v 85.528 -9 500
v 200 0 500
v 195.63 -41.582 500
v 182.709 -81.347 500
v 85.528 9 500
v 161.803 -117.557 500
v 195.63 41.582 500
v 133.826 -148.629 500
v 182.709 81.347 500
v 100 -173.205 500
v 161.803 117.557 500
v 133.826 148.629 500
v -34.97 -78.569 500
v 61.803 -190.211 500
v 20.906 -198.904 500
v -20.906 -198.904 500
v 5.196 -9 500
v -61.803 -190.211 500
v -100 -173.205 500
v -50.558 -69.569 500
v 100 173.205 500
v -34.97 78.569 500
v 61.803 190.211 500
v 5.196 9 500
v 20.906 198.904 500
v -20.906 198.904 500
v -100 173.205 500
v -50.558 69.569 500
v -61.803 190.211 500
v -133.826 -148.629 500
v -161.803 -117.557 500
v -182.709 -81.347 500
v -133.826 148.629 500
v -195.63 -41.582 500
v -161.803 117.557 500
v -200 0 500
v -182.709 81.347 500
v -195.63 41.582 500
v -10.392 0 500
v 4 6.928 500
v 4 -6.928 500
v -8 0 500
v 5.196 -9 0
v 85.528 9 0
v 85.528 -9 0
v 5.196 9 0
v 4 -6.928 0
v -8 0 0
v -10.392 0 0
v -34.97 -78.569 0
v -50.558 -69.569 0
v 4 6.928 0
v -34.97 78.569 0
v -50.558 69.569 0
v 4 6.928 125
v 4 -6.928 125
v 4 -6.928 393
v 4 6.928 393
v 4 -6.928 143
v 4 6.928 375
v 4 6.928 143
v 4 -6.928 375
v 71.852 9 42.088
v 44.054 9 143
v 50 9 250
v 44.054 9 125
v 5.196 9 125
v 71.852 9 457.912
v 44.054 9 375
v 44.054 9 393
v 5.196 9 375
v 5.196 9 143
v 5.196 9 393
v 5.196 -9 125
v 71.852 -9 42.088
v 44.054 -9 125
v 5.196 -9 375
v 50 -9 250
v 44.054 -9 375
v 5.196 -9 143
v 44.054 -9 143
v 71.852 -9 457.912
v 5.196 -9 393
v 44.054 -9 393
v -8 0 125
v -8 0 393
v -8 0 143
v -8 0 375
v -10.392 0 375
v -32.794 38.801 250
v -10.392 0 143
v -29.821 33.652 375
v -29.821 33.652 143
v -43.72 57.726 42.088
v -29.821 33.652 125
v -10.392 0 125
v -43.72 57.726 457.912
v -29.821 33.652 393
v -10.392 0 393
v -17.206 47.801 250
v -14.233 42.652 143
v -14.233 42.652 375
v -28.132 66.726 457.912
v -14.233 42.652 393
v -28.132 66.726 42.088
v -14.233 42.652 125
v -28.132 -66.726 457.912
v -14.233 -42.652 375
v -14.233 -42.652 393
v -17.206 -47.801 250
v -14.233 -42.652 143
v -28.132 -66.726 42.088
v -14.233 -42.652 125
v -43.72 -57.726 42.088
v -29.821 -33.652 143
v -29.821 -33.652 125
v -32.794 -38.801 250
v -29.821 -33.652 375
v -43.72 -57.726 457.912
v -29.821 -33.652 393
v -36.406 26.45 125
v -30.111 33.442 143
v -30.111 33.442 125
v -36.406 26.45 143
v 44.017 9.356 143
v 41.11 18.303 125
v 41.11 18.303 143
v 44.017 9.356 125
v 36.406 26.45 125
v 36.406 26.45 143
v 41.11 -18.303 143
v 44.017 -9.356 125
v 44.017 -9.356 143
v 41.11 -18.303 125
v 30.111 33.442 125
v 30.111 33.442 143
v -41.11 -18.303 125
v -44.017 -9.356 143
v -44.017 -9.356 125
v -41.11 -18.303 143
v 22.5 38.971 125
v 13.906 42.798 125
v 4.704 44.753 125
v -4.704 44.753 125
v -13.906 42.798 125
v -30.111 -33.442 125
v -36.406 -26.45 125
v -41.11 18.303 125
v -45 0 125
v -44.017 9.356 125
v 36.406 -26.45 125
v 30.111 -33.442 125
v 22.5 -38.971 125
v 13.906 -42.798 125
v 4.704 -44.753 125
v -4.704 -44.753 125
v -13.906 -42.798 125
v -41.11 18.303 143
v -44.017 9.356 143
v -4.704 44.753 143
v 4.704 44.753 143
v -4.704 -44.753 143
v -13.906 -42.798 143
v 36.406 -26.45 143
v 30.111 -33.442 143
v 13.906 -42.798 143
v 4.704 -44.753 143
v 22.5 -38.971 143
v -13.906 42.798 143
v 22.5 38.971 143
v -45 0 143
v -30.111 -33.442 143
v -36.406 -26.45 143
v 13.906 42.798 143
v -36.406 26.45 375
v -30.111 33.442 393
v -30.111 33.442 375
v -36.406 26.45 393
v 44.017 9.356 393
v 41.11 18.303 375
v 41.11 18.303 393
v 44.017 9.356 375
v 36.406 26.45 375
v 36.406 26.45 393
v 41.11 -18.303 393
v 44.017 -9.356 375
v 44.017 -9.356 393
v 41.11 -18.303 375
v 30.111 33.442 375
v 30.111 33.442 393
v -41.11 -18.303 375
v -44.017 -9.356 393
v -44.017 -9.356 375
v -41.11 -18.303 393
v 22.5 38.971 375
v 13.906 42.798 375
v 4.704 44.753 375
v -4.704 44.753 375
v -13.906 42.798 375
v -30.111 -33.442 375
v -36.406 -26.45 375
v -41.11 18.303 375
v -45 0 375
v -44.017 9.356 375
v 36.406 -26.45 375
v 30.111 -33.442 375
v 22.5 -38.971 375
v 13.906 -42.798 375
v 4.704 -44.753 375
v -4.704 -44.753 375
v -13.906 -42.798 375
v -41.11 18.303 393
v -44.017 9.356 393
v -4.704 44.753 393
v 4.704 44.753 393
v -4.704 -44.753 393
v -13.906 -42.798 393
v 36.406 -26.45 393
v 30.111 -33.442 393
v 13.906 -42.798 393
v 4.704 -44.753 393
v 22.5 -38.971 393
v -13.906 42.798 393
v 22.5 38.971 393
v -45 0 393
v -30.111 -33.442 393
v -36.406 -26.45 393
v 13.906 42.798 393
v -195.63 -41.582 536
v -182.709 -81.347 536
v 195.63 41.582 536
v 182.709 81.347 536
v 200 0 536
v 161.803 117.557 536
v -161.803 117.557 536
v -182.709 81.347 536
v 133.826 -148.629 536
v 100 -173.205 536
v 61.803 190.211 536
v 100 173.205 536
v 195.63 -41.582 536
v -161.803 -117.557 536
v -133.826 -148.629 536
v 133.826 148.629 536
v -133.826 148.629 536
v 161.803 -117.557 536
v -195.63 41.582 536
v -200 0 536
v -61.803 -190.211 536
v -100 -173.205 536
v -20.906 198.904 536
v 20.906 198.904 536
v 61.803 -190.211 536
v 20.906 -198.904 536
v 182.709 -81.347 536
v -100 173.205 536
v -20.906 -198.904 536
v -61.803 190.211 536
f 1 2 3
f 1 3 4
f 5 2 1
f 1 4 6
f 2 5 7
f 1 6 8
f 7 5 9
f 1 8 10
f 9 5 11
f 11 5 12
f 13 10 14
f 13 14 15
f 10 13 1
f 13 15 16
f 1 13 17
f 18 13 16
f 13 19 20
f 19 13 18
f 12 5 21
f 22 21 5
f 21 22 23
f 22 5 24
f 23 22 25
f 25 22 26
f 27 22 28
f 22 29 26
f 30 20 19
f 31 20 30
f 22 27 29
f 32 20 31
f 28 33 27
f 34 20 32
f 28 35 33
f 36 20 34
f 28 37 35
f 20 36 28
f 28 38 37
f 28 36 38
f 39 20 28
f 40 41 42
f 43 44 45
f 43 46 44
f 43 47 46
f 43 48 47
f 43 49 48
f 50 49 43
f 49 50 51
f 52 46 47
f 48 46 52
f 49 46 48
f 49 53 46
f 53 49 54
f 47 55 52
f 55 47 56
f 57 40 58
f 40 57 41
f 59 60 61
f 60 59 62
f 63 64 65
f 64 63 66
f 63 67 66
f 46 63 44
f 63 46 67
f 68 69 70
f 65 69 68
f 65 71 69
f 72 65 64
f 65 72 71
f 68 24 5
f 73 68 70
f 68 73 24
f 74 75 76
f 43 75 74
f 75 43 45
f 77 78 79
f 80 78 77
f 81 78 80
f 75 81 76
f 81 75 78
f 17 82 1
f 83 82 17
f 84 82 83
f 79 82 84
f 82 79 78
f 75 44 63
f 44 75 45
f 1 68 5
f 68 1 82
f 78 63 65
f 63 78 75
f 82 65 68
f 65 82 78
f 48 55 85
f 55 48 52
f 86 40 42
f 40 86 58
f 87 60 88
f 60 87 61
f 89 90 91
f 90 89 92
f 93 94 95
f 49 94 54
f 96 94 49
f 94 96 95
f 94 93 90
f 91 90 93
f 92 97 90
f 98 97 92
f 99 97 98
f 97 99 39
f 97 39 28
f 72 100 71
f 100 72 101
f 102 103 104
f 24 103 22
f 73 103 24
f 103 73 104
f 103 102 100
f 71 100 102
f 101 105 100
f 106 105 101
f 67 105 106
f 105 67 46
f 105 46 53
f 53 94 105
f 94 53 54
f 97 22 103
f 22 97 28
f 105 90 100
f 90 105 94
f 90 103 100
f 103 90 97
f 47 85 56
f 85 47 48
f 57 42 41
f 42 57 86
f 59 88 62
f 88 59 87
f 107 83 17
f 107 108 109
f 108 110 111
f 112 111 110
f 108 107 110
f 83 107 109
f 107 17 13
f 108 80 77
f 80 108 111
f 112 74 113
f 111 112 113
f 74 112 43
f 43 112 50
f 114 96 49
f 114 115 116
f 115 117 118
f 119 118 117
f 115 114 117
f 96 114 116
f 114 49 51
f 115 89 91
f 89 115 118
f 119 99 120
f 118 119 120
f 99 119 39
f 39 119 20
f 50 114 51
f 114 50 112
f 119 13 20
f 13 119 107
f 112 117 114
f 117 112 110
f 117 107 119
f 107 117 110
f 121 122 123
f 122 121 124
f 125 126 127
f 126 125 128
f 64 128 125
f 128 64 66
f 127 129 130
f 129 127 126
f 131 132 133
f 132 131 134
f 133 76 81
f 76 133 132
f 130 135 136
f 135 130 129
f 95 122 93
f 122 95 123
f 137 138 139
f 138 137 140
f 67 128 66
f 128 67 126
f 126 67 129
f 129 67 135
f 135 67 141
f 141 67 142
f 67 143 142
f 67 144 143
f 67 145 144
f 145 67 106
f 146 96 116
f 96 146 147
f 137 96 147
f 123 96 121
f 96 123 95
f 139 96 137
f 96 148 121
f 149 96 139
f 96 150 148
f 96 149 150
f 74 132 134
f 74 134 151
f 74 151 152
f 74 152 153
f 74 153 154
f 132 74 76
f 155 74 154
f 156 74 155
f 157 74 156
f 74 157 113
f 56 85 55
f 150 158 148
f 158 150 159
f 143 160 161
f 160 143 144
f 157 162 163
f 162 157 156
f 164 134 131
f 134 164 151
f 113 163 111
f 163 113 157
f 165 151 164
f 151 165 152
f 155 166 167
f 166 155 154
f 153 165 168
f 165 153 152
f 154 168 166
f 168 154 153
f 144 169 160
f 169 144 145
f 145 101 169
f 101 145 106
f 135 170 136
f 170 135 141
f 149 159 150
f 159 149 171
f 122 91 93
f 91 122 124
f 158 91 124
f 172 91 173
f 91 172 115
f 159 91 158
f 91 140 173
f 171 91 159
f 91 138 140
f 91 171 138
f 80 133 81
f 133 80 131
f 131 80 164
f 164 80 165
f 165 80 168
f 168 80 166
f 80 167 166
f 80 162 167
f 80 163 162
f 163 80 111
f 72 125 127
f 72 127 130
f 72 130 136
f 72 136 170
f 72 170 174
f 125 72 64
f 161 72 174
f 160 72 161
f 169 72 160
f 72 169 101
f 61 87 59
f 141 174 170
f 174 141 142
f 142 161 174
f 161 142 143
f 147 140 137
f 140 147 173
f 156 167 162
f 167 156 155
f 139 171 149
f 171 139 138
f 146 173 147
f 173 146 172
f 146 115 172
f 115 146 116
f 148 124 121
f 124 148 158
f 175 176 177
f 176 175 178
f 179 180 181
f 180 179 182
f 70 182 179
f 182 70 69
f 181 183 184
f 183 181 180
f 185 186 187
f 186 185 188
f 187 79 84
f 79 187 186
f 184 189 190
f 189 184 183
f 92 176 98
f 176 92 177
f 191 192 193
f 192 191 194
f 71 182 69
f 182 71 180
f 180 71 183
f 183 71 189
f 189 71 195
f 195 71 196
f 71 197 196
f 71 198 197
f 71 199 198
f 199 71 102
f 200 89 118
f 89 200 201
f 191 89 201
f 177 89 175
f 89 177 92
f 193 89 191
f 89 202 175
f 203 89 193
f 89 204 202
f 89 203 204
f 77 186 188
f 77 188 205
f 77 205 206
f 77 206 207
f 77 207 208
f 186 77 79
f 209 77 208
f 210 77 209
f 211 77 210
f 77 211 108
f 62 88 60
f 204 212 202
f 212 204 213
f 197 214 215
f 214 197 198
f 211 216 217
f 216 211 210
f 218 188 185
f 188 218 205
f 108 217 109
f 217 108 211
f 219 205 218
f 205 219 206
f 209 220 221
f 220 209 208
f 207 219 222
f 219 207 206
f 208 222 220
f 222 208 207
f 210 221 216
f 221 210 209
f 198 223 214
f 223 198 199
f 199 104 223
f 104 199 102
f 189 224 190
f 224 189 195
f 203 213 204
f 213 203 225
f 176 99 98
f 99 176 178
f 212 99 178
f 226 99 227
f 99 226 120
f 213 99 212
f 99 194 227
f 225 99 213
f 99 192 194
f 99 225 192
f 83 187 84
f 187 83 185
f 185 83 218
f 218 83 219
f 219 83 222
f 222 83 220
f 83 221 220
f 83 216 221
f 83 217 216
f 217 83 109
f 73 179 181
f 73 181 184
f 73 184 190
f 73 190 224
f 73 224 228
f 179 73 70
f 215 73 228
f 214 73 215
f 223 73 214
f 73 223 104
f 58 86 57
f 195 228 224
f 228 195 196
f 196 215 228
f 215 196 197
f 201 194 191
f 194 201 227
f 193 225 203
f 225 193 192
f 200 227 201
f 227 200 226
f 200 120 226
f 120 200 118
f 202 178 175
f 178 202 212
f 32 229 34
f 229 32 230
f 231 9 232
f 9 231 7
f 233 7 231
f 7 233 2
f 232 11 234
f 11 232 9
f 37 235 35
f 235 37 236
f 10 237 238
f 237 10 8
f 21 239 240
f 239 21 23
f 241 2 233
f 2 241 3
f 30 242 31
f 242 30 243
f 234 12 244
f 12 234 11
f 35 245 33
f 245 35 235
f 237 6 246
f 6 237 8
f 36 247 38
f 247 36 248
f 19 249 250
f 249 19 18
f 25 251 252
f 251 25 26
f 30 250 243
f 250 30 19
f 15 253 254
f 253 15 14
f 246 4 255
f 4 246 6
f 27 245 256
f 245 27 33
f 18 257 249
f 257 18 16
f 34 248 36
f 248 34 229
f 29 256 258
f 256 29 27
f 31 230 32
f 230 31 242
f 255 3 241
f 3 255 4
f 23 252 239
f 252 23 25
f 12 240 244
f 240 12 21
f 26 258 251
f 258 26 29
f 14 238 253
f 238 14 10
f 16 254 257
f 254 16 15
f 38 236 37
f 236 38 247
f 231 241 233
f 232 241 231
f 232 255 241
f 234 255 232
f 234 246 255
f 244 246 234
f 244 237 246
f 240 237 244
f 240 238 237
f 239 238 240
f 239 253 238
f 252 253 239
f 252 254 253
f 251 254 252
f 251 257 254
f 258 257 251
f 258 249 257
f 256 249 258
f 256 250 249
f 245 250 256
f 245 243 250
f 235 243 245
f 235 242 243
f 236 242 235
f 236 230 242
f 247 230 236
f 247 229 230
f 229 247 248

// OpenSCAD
w=330; //mm
d=330;
t=150; //thickness

h=420; //height
h_frame=350;

leg_t = 20; //leg thickness


legs_h = 500;
legs_w = 120;
mat_t = 18; //material thickness

cylinder_rad = legs_w/2-15;
top_rad = 200;

module leg(x,y, a) {
    
    rotate([0,0,a]) {
        difference() {
            translate([x,y,legs_h/2]){
                cube(size = [legs_w, mat_t,legs_h], center = true); //thin legs
            }
            translate([1050, 1+mat_t/2, legs_h/2]){
                rotate([90,0,0]) {
                    cylinder(h=mat_t+2, r=1000);
                }
            }
        }
    }
}

module cyl(h, r) {
    translate([0,0,h]){
        cylinder(h=mat_t, r=r);
    }
}


e=4;
leg(e+legs_w/2,0, 0);
leg(e+legs_w/2,0, 360/3);
leg(e+legs_w/2,0, 360*(2/3));


//Middle supporting disks
cyl(legs_h*(1/4), cylinder_rad);
cyl(legs_h*(3/4), cylinder_rad);

//Top
cyl(legs_h, top_rad);
cyl(legs_h+mat_t, top_rad);
